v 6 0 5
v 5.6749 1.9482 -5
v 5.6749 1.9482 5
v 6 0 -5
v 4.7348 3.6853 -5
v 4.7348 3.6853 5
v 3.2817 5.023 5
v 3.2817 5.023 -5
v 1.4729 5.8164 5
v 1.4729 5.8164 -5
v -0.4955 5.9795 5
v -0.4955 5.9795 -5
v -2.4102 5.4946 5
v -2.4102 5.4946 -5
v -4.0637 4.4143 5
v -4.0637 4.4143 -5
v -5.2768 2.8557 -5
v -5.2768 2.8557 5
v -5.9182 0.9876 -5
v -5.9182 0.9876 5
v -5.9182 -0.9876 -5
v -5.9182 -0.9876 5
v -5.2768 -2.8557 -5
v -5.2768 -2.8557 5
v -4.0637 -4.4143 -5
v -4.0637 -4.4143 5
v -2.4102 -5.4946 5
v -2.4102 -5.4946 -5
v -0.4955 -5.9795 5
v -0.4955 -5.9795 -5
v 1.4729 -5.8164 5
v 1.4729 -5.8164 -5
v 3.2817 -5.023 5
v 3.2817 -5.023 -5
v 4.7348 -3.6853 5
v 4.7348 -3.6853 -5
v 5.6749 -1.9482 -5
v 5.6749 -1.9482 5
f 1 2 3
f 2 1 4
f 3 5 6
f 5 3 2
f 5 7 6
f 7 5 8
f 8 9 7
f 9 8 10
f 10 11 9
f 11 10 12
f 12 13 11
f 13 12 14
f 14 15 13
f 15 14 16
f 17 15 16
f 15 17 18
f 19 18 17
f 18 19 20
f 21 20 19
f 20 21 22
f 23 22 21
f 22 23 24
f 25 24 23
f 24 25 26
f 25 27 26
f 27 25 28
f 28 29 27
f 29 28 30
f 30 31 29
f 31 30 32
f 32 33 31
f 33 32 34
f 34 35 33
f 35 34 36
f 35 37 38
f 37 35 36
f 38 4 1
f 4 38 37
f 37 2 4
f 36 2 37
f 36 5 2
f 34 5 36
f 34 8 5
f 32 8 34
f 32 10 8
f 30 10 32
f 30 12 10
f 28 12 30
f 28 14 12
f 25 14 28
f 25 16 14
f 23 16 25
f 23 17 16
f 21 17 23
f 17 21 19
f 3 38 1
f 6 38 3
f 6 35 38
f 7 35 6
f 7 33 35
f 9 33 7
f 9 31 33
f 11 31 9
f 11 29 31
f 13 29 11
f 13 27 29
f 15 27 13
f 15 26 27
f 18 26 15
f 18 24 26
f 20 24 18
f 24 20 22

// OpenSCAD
// Generated by generate_scads.py
cylinder(h=10, r=6, center=true);
